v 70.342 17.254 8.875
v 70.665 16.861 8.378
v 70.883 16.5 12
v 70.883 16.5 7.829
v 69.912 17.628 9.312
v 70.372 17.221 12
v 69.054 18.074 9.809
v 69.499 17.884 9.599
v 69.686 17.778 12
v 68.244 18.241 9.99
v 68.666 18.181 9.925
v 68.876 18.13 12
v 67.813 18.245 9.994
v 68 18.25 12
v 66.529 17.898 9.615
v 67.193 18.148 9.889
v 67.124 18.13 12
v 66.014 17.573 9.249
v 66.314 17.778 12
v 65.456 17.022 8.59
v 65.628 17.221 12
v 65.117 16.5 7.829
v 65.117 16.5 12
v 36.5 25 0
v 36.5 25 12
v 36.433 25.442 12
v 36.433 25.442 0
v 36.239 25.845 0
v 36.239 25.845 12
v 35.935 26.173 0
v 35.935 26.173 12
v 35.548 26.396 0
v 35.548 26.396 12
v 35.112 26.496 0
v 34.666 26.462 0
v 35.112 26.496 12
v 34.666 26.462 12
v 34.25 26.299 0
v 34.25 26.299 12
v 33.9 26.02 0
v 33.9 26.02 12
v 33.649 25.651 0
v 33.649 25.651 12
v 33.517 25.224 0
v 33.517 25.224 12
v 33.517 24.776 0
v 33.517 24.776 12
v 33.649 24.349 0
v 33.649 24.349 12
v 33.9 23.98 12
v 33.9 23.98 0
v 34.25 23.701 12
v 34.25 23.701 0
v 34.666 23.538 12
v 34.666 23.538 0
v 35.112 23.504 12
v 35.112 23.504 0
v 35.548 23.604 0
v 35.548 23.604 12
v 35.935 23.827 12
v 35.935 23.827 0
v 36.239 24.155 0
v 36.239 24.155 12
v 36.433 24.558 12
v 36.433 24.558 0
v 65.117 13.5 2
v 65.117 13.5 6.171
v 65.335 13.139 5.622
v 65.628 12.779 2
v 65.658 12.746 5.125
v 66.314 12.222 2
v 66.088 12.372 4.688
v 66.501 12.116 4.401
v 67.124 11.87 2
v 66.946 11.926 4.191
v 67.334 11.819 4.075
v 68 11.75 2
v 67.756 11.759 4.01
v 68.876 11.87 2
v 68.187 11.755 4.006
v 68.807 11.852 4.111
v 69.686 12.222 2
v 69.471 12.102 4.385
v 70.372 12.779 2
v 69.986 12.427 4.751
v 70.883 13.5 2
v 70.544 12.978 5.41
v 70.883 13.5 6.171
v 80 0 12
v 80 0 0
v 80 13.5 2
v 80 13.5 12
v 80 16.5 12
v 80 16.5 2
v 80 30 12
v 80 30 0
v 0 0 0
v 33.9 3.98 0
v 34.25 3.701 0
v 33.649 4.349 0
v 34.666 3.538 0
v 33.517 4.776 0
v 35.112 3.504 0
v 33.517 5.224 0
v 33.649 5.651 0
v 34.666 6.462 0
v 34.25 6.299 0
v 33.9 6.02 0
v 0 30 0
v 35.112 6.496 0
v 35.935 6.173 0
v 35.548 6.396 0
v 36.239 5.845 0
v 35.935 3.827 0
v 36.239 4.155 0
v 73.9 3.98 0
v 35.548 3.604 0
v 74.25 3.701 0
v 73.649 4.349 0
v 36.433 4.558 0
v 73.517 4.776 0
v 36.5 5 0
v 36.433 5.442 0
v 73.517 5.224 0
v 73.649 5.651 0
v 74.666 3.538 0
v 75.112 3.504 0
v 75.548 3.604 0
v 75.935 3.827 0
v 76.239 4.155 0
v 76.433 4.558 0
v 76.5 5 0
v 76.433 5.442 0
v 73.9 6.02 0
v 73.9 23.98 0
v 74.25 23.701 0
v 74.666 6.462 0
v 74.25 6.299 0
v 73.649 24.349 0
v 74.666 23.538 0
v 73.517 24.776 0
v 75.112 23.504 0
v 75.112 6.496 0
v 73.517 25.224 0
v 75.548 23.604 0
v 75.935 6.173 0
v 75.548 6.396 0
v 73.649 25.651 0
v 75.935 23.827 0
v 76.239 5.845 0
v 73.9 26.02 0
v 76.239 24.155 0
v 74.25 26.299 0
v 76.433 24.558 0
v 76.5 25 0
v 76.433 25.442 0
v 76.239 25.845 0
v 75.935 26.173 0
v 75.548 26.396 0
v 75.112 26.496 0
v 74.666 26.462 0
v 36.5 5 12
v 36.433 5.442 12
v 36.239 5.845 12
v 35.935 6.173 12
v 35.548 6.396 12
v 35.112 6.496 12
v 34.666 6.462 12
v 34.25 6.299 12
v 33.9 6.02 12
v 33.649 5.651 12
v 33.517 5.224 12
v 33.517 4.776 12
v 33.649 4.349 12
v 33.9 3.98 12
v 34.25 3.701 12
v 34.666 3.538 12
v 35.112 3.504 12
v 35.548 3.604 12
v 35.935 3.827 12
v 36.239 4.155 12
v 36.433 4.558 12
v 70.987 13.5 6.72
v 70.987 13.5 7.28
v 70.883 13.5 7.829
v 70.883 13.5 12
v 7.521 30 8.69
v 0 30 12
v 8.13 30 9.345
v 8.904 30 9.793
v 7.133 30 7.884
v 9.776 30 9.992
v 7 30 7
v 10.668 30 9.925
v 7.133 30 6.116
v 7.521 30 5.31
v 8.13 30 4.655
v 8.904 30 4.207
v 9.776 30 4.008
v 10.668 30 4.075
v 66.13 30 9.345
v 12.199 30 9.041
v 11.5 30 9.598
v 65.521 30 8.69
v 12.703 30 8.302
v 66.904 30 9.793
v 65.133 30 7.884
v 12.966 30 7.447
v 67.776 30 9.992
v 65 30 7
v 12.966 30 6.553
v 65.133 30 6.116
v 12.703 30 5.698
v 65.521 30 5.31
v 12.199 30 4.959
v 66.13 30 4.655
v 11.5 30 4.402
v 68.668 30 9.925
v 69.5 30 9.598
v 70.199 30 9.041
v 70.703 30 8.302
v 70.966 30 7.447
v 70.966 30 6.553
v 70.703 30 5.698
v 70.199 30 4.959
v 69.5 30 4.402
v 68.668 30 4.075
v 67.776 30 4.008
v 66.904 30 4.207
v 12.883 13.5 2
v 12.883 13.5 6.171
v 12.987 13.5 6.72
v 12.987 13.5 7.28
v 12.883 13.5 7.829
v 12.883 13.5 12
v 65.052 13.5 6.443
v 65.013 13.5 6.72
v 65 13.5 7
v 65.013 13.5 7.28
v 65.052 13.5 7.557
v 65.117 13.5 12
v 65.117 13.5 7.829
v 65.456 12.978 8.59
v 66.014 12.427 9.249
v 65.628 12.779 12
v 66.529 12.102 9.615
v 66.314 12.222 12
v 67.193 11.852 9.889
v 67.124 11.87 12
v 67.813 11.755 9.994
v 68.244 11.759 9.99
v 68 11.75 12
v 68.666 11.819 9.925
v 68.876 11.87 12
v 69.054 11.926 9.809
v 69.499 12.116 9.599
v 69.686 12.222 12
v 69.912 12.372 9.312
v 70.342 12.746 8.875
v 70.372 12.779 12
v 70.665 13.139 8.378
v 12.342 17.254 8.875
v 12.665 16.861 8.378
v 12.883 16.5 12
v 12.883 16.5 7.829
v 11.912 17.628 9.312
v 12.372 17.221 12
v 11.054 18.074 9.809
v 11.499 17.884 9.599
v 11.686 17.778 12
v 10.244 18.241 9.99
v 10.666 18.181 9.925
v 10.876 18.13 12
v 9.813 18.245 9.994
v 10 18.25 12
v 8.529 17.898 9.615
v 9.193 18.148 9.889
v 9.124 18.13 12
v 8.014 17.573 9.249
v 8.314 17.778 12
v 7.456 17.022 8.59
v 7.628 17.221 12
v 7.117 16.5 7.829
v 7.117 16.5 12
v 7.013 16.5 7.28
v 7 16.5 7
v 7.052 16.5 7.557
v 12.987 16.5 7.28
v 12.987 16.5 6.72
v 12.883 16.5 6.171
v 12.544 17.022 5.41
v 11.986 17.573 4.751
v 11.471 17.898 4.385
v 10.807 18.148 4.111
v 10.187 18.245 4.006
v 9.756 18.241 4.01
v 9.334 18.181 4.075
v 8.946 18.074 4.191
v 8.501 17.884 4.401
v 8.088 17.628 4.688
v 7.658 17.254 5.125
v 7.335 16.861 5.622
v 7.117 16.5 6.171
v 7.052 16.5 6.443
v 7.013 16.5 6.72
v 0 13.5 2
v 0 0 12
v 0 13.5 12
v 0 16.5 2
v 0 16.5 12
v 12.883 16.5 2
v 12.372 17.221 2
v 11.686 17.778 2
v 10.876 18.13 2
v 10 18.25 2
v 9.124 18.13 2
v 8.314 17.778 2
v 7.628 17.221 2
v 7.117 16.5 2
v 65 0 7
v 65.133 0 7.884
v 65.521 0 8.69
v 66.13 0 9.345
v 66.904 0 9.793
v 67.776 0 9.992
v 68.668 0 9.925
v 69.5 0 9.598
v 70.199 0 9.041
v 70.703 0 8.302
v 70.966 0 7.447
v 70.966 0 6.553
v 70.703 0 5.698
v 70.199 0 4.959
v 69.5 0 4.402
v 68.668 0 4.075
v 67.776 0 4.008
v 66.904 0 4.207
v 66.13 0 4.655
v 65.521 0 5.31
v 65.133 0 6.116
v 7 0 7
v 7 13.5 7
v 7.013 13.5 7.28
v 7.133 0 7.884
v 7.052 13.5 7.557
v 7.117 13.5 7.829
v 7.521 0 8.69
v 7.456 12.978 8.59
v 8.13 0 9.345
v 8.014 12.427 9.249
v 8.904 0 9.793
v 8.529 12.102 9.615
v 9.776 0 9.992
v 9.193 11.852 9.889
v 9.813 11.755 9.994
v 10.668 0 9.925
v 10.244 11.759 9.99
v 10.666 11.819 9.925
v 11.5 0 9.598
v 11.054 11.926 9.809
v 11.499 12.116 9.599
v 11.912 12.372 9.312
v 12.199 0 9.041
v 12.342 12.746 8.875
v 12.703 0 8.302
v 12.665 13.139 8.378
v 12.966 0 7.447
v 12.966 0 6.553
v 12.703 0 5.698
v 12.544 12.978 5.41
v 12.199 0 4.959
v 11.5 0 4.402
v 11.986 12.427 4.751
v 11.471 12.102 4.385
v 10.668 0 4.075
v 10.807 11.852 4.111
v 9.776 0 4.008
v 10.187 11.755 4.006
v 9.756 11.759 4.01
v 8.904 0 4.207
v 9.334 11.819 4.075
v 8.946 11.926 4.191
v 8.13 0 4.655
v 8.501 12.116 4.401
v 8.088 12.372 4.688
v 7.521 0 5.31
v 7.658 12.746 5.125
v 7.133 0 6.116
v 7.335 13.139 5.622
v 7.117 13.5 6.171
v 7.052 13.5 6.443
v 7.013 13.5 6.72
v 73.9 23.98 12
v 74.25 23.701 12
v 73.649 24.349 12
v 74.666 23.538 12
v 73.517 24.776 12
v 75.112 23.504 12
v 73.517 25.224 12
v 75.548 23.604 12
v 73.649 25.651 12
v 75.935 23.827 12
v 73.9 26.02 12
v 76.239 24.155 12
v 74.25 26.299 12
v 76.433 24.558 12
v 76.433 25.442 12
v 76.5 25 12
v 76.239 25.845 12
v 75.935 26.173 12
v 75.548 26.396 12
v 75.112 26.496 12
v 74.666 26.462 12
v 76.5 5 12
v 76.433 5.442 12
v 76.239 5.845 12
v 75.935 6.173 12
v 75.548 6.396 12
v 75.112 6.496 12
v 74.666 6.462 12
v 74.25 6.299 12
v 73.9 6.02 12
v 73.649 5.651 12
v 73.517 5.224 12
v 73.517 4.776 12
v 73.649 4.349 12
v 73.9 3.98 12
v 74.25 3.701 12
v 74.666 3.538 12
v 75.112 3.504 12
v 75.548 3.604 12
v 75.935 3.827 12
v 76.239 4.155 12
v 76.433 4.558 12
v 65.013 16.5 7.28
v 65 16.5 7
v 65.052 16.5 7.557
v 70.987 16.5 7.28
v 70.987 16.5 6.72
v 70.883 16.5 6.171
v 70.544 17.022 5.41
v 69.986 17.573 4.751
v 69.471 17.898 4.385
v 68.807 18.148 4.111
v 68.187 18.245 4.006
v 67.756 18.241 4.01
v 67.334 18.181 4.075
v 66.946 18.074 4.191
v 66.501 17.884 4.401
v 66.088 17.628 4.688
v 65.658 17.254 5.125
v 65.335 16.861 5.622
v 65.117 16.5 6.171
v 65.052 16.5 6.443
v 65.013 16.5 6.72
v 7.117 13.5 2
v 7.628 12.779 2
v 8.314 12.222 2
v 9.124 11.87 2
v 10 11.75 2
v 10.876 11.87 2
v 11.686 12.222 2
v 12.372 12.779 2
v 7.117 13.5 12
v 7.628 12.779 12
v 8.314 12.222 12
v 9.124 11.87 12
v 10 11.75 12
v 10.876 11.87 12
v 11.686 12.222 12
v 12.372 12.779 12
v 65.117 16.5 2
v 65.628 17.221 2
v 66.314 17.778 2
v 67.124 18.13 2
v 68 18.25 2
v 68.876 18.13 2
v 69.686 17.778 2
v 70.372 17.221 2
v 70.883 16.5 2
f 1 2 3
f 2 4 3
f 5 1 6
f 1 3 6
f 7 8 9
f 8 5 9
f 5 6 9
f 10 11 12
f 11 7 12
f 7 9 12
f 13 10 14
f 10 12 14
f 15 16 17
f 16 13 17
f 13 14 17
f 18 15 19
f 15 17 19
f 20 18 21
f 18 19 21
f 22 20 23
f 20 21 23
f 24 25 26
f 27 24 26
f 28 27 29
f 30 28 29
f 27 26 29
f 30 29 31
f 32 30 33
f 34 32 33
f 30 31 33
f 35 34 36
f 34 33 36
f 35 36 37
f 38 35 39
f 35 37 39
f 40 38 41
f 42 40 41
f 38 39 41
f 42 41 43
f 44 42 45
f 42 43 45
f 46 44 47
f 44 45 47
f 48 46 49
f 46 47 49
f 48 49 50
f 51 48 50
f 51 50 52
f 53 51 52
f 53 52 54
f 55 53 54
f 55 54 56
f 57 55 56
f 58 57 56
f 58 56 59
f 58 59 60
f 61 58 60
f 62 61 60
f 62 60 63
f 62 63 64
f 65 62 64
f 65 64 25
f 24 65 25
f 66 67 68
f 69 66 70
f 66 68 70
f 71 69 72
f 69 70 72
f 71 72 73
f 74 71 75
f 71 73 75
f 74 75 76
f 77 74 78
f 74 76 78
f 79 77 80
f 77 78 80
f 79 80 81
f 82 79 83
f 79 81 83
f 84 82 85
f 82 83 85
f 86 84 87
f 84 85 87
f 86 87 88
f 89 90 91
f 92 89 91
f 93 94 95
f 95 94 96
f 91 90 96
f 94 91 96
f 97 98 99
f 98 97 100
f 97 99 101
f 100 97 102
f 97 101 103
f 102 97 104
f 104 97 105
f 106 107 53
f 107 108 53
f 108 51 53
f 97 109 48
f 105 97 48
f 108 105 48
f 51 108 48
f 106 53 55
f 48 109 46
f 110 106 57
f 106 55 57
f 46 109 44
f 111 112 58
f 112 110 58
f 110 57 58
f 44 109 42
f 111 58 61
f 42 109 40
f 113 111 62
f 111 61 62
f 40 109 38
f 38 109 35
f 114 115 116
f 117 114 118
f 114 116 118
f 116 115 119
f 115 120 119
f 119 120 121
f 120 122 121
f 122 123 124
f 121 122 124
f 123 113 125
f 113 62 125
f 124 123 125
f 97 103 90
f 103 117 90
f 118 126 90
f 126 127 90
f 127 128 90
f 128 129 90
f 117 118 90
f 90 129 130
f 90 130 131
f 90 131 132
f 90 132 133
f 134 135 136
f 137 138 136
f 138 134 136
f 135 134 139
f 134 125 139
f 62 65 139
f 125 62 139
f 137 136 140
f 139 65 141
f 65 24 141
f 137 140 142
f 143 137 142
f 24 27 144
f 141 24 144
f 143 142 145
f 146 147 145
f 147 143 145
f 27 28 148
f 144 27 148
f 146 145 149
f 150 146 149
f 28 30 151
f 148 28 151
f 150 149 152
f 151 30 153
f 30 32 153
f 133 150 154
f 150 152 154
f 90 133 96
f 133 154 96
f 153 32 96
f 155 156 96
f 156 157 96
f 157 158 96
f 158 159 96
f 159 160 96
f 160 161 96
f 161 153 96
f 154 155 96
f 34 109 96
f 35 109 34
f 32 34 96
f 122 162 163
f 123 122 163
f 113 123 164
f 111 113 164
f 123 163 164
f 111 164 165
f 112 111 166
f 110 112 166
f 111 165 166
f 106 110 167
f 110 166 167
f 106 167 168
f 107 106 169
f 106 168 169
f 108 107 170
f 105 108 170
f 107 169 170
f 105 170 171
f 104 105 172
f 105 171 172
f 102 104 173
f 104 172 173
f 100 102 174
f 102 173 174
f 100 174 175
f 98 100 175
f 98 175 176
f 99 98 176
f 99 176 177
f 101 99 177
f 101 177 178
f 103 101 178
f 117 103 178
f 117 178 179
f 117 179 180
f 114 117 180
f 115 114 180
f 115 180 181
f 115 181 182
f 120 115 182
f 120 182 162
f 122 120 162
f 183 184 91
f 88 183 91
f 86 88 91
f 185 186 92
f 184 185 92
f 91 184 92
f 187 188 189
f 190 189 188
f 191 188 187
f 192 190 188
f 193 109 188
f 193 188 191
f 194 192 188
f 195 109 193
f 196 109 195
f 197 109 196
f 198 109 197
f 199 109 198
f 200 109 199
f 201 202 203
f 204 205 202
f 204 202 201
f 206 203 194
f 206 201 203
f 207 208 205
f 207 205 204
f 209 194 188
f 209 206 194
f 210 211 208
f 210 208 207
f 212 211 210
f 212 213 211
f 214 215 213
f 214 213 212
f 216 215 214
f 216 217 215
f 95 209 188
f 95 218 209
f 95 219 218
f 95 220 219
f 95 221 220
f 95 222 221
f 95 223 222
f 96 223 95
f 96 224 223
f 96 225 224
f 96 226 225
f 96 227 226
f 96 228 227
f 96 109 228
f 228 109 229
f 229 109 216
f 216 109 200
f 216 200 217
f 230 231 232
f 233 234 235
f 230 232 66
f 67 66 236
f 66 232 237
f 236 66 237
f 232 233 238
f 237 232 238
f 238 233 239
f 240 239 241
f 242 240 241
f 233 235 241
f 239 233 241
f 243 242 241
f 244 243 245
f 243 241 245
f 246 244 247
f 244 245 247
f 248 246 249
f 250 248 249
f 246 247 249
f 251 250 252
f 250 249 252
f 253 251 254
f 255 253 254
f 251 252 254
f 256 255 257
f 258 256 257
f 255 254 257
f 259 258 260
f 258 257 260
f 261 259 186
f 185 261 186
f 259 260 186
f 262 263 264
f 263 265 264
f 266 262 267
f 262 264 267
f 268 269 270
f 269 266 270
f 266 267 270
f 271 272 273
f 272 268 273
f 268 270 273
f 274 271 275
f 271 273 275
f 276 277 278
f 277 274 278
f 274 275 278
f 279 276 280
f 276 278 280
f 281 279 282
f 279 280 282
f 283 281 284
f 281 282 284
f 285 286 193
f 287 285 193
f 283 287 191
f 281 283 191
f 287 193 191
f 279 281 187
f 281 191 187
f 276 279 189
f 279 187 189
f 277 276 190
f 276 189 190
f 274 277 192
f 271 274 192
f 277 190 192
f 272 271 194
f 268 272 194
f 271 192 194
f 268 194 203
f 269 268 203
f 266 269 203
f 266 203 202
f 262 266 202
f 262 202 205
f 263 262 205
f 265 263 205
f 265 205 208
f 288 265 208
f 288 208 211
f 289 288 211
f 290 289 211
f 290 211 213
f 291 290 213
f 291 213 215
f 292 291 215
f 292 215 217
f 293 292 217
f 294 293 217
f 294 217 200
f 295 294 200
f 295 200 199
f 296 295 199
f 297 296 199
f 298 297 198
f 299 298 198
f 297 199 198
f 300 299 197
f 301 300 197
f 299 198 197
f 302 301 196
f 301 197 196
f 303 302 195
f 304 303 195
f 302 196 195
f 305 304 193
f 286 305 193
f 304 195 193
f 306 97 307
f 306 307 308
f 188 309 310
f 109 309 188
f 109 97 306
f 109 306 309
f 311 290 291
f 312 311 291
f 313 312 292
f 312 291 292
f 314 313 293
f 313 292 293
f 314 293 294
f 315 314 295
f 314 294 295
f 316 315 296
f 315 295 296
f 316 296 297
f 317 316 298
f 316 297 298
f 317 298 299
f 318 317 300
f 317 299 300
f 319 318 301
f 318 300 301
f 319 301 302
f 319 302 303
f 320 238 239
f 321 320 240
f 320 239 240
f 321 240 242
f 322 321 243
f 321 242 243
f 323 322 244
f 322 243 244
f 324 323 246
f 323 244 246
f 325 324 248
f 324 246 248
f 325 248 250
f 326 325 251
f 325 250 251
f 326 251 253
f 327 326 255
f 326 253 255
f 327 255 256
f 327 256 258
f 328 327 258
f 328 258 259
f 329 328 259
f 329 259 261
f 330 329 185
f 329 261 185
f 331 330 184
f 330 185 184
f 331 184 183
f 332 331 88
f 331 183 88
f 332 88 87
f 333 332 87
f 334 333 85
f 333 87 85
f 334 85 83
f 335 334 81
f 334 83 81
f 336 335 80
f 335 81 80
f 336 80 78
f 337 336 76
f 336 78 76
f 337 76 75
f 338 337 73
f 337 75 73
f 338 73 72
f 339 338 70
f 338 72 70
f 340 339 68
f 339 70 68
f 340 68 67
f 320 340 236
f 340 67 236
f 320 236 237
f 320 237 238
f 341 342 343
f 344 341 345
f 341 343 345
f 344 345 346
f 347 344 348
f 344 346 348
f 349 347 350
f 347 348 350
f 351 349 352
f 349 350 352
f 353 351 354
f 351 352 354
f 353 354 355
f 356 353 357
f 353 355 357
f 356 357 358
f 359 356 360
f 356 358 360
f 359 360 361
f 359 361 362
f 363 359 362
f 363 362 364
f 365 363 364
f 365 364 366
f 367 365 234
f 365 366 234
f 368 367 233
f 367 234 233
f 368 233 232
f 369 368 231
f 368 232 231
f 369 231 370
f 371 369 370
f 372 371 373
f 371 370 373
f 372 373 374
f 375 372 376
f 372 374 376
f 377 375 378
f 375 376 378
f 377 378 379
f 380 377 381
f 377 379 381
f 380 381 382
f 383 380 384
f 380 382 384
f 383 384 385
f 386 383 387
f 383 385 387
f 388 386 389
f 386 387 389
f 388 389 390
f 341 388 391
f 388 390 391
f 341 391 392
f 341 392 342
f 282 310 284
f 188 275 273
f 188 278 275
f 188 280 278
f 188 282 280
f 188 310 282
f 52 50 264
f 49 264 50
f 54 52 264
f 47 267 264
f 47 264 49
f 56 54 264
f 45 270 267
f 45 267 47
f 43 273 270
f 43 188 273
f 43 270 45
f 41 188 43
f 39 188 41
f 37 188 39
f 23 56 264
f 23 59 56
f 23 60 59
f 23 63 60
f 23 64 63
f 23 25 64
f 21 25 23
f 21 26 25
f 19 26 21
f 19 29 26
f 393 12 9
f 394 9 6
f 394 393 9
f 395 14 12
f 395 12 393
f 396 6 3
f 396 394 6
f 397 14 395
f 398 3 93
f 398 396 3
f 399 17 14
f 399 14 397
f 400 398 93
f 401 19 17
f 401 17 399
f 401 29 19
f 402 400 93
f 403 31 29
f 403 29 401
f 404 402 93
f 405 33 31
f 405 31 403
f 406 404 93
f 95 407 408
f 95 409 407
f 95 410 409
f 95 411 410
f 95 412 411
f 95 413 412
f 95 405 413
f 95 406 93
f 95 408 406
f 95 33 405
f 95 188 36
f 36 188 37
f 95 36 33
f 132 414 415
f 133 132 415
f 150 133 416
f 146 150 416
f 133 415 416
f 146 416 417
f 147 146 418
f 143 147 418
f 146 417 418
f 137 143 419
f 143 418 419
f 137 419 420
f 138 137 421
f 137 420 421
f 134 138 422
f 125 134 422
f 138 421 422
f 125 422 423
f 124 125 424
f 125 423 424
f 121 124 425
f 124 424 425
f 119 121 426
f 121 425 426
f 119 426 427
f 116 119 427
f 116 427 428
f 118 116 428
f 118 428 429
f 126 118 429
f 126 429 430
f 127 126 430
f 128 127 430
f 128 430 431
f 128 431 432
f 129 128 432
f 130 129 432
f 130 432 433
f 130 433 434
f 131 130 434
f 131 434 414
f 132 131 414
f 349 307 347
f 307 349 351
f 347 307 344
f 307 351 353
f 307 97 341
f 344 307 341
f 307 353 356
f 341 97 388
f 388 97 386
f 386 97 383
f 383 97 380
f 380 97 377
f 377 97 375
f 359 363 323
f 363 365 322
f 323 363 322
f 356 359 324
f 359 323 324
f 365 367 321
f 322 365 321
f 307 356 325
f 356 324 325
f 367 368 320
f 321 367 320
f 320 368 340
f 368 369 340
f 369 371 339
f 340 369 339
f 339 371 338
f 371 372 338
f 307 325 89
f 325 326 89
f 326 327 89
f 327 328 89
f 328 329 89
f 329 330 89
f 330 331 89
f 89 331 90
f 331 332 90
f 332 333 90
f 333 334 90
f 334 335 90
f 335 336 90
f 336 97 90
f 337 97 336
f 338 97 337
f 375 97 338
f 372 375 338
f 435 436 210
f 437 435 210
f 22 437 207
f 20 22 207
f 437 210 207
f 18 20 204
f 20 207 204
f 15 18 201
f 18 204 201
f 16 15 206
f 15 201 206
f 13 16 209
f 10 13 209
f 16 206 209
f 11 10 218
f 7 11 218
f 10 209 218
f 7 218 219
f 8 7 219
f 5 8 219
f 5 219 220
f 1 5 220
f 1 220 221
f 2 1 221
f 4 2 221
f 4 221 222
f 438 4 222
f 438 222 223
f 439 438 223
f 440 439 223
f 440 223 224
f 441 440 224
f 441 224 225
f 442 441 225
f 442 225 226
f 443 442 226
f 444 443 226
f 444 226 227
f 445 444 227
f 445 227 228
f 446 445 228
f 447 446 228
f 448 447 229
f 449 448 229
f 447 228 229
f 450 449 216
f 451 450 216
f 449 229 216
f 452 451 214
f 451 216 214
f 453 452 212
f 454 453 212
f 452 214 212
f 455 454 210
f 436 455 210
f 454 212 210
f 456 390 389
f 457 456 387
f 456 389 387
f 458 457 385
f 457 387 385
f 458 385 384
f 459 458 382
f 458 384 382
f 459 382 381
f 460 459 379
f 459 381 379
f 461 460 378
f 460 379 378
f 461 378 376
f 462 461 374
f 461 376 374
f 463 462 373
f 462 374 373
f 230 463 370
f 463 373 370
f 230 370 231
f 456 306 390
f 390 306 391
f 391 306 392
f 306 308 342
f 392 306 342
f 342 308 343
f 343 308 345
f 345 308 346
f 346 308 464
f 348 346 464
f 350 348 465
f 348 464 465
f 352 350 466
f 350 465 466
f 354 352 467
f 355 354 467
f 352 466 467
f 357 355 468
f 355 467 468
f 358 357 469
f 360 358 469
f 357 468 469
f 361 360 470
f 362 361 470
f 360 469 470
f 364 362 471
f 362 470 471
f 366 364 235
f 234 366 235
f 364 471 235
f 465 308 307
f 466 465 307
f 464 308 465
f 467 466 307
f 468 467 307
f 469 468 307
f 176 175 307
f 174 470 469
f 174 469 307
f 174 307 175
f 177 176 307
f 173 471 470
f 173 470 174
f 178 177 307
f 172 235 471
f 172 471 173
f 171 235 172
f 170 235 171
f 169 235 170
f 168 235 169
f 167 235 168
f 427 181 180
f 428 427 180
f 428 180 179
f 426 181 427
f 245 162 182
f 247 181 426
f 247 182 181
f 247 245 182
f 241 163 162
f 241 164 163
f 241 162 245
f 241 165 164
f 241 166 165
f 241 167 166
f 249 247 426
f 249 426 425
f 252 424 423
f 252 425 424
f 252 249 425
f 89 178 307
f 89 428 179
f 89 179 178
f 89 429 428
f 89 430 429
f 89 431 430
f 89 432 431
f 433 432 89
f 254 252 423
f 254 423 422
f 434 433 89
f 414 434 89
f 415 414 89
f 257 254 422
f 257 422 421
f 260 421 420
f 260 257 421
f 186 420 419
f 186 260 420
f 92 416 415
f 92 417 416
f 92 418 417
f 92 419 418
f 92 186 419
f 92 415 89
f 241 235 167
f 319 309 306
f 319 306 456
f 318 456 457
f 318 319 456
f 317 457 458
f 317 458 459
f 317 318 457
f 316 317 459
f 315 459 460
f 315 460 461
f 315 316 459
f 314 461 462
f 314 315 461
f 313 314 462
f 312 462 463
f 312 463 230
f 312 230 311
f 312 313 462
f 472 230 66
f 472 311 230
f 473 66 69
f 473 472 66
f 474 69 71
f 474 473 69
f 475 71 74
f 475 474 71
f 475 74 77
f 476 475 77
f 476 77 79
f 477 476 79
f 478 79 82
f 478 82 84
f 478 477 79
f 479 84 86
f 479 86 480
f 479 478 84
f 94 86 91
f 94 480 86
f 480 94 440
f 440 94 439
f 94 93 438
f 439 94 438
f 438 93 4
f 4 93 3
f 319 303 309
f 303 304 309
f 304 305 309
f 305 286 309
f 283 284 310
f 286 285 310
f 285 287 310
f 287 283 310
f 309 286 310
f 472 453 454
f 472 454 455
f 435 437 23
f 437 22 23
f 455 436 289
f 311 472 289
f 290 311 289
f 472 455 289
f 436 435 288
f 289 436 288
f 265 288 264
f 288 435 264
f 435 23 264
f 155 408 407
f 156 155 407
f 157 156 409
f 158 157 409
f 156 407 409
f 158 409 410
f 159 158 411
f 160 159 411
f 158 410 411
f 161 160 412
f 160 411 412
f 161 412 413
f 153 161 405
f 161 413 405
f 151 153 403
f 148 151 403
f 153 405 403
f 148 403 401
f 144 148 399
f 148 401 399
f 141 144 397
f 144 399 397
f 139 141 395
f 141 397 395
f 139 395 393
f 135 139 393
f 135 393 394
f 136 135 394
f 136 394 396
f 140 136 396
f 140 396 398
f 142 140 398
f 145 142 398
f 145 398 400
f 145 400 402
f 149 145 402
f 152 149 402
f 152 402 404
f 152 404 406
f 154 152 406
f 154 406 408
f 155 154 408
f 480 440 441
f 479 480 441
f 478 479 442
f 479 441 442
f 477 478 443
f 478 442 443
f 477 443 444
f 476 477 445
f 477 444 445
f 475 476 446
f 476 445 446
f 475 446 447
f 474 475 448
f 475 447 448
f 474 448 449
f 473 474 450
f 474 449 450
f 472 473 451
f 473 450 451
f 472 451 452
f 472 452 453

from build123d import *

# Parameters (mm, degrees)
F0_W     = 80
F0_H     = 30
F1_DEPTH = 12
F2_R     = 1.5
F3_DEPTH = 25
F5_DEPTH = 5
F6_DEPTH = 10
F7_R     = 3
F8_DEPTH = 30.001


with BuildPart() as f1:
    # F0 (on Top) → F1 (new body)
    with BuildSketch(Plane.XY):
        with Locations((40, 15)):
            Rectangle(F0_W, F0_H)
    extrude(amount=F1_DEPTH)

    # F2 (on face) → F3 (cut)
    with BuildSketch(Plane.XY.offset(12)):
        with Locations((35, 5)):
            Circle(F2_R)
        with Locations((35, 25)):
            Circle(F2_R)
        with Locations((75, 5)):
            Circle(F2_R)
        with Locations((75, 25)):
            Circle(F2_R)
    extrude(amount=-F3_DEPTH, mode=Mode.SUBTRACT)

    # F4 (on face) → F5 (cut)
    with BuildSketch(Plane.XY.offset(12)):
        with BuildLine():
            Line((42.8169872981, 13.5), (65.1168593513, 13.5))
            ThreePointArc((65.1168593513, 13.5), (68, 11.75), (70.8831406487, 13.5))
            Line((70.8831406487, 13.5), (80, 13.5))
            Line((80, 13.5), (80, 16.5))
            Line((80, 16.5), (70.8831406487, 16.5))
            ThreePointArc((70.8831406487, 16.5), (68, 18.25), (65.1168593513, 16.5))
            Line((65.1168593513, 16.5), (42.8169872981, 16.5))
            Line((42.8169872981, 16.5), (12.8831406487, 16.5))
            ThreePointArc((12.8831406487, 16.5), (10, 18.25), (7.1168593513, 16.5))
            Line((7.1168593513, 16.5), (0, 16.5))
            Line((0, 16.5), (0, 13.5))
            Line((0, 13.5), (7.1168593513, 13.5))
            ThreePointArc((7.1168593513, 13.5), (10, 11.75), (12.8831406487, 13.5))
            Line((12.8831406487, 13.5), (42.8169872981, 13.5))
        make_face()
    extrude(amount=-F5_DEPTH, mode=Mode.SUBTRACT)

    # F4 (on face) → F6 (cut)
    with BuildSketch(Plane.XY.offset(12)):
        with BuildLine():
            Line((42.8169872981, 13.5), (65.1168593513, 13.5))
            ThreePointArc((65.1168593513, 13.5), (68, 11.75), (70.8831406487, 13.5))
            Line((70.8831406487, 13.5), (80, 13.5))
            Line((80, 13.5), (80, 16.5))
            Line((80, 16.5), (70.8831406487, 16.5))
            ThreePointArc((70.8831406487, 16.5), (68, 18.25), (65.1168593513, 16.5))
            Line((65.1168593513, 16.5), (42.8169872981, 16.5))
            Line((42.8169872981, 16.5), (12.8831406487, 16.5))
            ThreePointArc((12.8831406487, 16.5), (10, 18.25), (7.1168593513, 16.5))
            Line((7.1168593513, 16.5), (0, 16.5))
            Line((0, 16.5), (0, 13.5))
            Line((0, 13.5), (7.1168593513, 13.5))
            ThreePointArc((7.1168593513, 13.5), (10, 11.75), (12.8831406487, 13.5))
            Line((12.8831406487, 13.5), (42.8169872981, 13.5))
        make_face()
    extrude(amount=-F6_DEPTH, mode=Mode.SUBTRACT)

    # F7 (on face) → F8 (cut, through all)
    with BuildSketch(Plane(origin=(0, 30, 0), x_dir=(-1, 0, 0), z_dir=(0, 1, 0))):
        with Locations((-68, 7)):
            Circle(F7_R)
        with Locations((-10, 7)):
            Circle(F7_R)
    extrude(amount=-F8_DEPTH, mode=Mode.SUBTRACT)


solid = f1.part
